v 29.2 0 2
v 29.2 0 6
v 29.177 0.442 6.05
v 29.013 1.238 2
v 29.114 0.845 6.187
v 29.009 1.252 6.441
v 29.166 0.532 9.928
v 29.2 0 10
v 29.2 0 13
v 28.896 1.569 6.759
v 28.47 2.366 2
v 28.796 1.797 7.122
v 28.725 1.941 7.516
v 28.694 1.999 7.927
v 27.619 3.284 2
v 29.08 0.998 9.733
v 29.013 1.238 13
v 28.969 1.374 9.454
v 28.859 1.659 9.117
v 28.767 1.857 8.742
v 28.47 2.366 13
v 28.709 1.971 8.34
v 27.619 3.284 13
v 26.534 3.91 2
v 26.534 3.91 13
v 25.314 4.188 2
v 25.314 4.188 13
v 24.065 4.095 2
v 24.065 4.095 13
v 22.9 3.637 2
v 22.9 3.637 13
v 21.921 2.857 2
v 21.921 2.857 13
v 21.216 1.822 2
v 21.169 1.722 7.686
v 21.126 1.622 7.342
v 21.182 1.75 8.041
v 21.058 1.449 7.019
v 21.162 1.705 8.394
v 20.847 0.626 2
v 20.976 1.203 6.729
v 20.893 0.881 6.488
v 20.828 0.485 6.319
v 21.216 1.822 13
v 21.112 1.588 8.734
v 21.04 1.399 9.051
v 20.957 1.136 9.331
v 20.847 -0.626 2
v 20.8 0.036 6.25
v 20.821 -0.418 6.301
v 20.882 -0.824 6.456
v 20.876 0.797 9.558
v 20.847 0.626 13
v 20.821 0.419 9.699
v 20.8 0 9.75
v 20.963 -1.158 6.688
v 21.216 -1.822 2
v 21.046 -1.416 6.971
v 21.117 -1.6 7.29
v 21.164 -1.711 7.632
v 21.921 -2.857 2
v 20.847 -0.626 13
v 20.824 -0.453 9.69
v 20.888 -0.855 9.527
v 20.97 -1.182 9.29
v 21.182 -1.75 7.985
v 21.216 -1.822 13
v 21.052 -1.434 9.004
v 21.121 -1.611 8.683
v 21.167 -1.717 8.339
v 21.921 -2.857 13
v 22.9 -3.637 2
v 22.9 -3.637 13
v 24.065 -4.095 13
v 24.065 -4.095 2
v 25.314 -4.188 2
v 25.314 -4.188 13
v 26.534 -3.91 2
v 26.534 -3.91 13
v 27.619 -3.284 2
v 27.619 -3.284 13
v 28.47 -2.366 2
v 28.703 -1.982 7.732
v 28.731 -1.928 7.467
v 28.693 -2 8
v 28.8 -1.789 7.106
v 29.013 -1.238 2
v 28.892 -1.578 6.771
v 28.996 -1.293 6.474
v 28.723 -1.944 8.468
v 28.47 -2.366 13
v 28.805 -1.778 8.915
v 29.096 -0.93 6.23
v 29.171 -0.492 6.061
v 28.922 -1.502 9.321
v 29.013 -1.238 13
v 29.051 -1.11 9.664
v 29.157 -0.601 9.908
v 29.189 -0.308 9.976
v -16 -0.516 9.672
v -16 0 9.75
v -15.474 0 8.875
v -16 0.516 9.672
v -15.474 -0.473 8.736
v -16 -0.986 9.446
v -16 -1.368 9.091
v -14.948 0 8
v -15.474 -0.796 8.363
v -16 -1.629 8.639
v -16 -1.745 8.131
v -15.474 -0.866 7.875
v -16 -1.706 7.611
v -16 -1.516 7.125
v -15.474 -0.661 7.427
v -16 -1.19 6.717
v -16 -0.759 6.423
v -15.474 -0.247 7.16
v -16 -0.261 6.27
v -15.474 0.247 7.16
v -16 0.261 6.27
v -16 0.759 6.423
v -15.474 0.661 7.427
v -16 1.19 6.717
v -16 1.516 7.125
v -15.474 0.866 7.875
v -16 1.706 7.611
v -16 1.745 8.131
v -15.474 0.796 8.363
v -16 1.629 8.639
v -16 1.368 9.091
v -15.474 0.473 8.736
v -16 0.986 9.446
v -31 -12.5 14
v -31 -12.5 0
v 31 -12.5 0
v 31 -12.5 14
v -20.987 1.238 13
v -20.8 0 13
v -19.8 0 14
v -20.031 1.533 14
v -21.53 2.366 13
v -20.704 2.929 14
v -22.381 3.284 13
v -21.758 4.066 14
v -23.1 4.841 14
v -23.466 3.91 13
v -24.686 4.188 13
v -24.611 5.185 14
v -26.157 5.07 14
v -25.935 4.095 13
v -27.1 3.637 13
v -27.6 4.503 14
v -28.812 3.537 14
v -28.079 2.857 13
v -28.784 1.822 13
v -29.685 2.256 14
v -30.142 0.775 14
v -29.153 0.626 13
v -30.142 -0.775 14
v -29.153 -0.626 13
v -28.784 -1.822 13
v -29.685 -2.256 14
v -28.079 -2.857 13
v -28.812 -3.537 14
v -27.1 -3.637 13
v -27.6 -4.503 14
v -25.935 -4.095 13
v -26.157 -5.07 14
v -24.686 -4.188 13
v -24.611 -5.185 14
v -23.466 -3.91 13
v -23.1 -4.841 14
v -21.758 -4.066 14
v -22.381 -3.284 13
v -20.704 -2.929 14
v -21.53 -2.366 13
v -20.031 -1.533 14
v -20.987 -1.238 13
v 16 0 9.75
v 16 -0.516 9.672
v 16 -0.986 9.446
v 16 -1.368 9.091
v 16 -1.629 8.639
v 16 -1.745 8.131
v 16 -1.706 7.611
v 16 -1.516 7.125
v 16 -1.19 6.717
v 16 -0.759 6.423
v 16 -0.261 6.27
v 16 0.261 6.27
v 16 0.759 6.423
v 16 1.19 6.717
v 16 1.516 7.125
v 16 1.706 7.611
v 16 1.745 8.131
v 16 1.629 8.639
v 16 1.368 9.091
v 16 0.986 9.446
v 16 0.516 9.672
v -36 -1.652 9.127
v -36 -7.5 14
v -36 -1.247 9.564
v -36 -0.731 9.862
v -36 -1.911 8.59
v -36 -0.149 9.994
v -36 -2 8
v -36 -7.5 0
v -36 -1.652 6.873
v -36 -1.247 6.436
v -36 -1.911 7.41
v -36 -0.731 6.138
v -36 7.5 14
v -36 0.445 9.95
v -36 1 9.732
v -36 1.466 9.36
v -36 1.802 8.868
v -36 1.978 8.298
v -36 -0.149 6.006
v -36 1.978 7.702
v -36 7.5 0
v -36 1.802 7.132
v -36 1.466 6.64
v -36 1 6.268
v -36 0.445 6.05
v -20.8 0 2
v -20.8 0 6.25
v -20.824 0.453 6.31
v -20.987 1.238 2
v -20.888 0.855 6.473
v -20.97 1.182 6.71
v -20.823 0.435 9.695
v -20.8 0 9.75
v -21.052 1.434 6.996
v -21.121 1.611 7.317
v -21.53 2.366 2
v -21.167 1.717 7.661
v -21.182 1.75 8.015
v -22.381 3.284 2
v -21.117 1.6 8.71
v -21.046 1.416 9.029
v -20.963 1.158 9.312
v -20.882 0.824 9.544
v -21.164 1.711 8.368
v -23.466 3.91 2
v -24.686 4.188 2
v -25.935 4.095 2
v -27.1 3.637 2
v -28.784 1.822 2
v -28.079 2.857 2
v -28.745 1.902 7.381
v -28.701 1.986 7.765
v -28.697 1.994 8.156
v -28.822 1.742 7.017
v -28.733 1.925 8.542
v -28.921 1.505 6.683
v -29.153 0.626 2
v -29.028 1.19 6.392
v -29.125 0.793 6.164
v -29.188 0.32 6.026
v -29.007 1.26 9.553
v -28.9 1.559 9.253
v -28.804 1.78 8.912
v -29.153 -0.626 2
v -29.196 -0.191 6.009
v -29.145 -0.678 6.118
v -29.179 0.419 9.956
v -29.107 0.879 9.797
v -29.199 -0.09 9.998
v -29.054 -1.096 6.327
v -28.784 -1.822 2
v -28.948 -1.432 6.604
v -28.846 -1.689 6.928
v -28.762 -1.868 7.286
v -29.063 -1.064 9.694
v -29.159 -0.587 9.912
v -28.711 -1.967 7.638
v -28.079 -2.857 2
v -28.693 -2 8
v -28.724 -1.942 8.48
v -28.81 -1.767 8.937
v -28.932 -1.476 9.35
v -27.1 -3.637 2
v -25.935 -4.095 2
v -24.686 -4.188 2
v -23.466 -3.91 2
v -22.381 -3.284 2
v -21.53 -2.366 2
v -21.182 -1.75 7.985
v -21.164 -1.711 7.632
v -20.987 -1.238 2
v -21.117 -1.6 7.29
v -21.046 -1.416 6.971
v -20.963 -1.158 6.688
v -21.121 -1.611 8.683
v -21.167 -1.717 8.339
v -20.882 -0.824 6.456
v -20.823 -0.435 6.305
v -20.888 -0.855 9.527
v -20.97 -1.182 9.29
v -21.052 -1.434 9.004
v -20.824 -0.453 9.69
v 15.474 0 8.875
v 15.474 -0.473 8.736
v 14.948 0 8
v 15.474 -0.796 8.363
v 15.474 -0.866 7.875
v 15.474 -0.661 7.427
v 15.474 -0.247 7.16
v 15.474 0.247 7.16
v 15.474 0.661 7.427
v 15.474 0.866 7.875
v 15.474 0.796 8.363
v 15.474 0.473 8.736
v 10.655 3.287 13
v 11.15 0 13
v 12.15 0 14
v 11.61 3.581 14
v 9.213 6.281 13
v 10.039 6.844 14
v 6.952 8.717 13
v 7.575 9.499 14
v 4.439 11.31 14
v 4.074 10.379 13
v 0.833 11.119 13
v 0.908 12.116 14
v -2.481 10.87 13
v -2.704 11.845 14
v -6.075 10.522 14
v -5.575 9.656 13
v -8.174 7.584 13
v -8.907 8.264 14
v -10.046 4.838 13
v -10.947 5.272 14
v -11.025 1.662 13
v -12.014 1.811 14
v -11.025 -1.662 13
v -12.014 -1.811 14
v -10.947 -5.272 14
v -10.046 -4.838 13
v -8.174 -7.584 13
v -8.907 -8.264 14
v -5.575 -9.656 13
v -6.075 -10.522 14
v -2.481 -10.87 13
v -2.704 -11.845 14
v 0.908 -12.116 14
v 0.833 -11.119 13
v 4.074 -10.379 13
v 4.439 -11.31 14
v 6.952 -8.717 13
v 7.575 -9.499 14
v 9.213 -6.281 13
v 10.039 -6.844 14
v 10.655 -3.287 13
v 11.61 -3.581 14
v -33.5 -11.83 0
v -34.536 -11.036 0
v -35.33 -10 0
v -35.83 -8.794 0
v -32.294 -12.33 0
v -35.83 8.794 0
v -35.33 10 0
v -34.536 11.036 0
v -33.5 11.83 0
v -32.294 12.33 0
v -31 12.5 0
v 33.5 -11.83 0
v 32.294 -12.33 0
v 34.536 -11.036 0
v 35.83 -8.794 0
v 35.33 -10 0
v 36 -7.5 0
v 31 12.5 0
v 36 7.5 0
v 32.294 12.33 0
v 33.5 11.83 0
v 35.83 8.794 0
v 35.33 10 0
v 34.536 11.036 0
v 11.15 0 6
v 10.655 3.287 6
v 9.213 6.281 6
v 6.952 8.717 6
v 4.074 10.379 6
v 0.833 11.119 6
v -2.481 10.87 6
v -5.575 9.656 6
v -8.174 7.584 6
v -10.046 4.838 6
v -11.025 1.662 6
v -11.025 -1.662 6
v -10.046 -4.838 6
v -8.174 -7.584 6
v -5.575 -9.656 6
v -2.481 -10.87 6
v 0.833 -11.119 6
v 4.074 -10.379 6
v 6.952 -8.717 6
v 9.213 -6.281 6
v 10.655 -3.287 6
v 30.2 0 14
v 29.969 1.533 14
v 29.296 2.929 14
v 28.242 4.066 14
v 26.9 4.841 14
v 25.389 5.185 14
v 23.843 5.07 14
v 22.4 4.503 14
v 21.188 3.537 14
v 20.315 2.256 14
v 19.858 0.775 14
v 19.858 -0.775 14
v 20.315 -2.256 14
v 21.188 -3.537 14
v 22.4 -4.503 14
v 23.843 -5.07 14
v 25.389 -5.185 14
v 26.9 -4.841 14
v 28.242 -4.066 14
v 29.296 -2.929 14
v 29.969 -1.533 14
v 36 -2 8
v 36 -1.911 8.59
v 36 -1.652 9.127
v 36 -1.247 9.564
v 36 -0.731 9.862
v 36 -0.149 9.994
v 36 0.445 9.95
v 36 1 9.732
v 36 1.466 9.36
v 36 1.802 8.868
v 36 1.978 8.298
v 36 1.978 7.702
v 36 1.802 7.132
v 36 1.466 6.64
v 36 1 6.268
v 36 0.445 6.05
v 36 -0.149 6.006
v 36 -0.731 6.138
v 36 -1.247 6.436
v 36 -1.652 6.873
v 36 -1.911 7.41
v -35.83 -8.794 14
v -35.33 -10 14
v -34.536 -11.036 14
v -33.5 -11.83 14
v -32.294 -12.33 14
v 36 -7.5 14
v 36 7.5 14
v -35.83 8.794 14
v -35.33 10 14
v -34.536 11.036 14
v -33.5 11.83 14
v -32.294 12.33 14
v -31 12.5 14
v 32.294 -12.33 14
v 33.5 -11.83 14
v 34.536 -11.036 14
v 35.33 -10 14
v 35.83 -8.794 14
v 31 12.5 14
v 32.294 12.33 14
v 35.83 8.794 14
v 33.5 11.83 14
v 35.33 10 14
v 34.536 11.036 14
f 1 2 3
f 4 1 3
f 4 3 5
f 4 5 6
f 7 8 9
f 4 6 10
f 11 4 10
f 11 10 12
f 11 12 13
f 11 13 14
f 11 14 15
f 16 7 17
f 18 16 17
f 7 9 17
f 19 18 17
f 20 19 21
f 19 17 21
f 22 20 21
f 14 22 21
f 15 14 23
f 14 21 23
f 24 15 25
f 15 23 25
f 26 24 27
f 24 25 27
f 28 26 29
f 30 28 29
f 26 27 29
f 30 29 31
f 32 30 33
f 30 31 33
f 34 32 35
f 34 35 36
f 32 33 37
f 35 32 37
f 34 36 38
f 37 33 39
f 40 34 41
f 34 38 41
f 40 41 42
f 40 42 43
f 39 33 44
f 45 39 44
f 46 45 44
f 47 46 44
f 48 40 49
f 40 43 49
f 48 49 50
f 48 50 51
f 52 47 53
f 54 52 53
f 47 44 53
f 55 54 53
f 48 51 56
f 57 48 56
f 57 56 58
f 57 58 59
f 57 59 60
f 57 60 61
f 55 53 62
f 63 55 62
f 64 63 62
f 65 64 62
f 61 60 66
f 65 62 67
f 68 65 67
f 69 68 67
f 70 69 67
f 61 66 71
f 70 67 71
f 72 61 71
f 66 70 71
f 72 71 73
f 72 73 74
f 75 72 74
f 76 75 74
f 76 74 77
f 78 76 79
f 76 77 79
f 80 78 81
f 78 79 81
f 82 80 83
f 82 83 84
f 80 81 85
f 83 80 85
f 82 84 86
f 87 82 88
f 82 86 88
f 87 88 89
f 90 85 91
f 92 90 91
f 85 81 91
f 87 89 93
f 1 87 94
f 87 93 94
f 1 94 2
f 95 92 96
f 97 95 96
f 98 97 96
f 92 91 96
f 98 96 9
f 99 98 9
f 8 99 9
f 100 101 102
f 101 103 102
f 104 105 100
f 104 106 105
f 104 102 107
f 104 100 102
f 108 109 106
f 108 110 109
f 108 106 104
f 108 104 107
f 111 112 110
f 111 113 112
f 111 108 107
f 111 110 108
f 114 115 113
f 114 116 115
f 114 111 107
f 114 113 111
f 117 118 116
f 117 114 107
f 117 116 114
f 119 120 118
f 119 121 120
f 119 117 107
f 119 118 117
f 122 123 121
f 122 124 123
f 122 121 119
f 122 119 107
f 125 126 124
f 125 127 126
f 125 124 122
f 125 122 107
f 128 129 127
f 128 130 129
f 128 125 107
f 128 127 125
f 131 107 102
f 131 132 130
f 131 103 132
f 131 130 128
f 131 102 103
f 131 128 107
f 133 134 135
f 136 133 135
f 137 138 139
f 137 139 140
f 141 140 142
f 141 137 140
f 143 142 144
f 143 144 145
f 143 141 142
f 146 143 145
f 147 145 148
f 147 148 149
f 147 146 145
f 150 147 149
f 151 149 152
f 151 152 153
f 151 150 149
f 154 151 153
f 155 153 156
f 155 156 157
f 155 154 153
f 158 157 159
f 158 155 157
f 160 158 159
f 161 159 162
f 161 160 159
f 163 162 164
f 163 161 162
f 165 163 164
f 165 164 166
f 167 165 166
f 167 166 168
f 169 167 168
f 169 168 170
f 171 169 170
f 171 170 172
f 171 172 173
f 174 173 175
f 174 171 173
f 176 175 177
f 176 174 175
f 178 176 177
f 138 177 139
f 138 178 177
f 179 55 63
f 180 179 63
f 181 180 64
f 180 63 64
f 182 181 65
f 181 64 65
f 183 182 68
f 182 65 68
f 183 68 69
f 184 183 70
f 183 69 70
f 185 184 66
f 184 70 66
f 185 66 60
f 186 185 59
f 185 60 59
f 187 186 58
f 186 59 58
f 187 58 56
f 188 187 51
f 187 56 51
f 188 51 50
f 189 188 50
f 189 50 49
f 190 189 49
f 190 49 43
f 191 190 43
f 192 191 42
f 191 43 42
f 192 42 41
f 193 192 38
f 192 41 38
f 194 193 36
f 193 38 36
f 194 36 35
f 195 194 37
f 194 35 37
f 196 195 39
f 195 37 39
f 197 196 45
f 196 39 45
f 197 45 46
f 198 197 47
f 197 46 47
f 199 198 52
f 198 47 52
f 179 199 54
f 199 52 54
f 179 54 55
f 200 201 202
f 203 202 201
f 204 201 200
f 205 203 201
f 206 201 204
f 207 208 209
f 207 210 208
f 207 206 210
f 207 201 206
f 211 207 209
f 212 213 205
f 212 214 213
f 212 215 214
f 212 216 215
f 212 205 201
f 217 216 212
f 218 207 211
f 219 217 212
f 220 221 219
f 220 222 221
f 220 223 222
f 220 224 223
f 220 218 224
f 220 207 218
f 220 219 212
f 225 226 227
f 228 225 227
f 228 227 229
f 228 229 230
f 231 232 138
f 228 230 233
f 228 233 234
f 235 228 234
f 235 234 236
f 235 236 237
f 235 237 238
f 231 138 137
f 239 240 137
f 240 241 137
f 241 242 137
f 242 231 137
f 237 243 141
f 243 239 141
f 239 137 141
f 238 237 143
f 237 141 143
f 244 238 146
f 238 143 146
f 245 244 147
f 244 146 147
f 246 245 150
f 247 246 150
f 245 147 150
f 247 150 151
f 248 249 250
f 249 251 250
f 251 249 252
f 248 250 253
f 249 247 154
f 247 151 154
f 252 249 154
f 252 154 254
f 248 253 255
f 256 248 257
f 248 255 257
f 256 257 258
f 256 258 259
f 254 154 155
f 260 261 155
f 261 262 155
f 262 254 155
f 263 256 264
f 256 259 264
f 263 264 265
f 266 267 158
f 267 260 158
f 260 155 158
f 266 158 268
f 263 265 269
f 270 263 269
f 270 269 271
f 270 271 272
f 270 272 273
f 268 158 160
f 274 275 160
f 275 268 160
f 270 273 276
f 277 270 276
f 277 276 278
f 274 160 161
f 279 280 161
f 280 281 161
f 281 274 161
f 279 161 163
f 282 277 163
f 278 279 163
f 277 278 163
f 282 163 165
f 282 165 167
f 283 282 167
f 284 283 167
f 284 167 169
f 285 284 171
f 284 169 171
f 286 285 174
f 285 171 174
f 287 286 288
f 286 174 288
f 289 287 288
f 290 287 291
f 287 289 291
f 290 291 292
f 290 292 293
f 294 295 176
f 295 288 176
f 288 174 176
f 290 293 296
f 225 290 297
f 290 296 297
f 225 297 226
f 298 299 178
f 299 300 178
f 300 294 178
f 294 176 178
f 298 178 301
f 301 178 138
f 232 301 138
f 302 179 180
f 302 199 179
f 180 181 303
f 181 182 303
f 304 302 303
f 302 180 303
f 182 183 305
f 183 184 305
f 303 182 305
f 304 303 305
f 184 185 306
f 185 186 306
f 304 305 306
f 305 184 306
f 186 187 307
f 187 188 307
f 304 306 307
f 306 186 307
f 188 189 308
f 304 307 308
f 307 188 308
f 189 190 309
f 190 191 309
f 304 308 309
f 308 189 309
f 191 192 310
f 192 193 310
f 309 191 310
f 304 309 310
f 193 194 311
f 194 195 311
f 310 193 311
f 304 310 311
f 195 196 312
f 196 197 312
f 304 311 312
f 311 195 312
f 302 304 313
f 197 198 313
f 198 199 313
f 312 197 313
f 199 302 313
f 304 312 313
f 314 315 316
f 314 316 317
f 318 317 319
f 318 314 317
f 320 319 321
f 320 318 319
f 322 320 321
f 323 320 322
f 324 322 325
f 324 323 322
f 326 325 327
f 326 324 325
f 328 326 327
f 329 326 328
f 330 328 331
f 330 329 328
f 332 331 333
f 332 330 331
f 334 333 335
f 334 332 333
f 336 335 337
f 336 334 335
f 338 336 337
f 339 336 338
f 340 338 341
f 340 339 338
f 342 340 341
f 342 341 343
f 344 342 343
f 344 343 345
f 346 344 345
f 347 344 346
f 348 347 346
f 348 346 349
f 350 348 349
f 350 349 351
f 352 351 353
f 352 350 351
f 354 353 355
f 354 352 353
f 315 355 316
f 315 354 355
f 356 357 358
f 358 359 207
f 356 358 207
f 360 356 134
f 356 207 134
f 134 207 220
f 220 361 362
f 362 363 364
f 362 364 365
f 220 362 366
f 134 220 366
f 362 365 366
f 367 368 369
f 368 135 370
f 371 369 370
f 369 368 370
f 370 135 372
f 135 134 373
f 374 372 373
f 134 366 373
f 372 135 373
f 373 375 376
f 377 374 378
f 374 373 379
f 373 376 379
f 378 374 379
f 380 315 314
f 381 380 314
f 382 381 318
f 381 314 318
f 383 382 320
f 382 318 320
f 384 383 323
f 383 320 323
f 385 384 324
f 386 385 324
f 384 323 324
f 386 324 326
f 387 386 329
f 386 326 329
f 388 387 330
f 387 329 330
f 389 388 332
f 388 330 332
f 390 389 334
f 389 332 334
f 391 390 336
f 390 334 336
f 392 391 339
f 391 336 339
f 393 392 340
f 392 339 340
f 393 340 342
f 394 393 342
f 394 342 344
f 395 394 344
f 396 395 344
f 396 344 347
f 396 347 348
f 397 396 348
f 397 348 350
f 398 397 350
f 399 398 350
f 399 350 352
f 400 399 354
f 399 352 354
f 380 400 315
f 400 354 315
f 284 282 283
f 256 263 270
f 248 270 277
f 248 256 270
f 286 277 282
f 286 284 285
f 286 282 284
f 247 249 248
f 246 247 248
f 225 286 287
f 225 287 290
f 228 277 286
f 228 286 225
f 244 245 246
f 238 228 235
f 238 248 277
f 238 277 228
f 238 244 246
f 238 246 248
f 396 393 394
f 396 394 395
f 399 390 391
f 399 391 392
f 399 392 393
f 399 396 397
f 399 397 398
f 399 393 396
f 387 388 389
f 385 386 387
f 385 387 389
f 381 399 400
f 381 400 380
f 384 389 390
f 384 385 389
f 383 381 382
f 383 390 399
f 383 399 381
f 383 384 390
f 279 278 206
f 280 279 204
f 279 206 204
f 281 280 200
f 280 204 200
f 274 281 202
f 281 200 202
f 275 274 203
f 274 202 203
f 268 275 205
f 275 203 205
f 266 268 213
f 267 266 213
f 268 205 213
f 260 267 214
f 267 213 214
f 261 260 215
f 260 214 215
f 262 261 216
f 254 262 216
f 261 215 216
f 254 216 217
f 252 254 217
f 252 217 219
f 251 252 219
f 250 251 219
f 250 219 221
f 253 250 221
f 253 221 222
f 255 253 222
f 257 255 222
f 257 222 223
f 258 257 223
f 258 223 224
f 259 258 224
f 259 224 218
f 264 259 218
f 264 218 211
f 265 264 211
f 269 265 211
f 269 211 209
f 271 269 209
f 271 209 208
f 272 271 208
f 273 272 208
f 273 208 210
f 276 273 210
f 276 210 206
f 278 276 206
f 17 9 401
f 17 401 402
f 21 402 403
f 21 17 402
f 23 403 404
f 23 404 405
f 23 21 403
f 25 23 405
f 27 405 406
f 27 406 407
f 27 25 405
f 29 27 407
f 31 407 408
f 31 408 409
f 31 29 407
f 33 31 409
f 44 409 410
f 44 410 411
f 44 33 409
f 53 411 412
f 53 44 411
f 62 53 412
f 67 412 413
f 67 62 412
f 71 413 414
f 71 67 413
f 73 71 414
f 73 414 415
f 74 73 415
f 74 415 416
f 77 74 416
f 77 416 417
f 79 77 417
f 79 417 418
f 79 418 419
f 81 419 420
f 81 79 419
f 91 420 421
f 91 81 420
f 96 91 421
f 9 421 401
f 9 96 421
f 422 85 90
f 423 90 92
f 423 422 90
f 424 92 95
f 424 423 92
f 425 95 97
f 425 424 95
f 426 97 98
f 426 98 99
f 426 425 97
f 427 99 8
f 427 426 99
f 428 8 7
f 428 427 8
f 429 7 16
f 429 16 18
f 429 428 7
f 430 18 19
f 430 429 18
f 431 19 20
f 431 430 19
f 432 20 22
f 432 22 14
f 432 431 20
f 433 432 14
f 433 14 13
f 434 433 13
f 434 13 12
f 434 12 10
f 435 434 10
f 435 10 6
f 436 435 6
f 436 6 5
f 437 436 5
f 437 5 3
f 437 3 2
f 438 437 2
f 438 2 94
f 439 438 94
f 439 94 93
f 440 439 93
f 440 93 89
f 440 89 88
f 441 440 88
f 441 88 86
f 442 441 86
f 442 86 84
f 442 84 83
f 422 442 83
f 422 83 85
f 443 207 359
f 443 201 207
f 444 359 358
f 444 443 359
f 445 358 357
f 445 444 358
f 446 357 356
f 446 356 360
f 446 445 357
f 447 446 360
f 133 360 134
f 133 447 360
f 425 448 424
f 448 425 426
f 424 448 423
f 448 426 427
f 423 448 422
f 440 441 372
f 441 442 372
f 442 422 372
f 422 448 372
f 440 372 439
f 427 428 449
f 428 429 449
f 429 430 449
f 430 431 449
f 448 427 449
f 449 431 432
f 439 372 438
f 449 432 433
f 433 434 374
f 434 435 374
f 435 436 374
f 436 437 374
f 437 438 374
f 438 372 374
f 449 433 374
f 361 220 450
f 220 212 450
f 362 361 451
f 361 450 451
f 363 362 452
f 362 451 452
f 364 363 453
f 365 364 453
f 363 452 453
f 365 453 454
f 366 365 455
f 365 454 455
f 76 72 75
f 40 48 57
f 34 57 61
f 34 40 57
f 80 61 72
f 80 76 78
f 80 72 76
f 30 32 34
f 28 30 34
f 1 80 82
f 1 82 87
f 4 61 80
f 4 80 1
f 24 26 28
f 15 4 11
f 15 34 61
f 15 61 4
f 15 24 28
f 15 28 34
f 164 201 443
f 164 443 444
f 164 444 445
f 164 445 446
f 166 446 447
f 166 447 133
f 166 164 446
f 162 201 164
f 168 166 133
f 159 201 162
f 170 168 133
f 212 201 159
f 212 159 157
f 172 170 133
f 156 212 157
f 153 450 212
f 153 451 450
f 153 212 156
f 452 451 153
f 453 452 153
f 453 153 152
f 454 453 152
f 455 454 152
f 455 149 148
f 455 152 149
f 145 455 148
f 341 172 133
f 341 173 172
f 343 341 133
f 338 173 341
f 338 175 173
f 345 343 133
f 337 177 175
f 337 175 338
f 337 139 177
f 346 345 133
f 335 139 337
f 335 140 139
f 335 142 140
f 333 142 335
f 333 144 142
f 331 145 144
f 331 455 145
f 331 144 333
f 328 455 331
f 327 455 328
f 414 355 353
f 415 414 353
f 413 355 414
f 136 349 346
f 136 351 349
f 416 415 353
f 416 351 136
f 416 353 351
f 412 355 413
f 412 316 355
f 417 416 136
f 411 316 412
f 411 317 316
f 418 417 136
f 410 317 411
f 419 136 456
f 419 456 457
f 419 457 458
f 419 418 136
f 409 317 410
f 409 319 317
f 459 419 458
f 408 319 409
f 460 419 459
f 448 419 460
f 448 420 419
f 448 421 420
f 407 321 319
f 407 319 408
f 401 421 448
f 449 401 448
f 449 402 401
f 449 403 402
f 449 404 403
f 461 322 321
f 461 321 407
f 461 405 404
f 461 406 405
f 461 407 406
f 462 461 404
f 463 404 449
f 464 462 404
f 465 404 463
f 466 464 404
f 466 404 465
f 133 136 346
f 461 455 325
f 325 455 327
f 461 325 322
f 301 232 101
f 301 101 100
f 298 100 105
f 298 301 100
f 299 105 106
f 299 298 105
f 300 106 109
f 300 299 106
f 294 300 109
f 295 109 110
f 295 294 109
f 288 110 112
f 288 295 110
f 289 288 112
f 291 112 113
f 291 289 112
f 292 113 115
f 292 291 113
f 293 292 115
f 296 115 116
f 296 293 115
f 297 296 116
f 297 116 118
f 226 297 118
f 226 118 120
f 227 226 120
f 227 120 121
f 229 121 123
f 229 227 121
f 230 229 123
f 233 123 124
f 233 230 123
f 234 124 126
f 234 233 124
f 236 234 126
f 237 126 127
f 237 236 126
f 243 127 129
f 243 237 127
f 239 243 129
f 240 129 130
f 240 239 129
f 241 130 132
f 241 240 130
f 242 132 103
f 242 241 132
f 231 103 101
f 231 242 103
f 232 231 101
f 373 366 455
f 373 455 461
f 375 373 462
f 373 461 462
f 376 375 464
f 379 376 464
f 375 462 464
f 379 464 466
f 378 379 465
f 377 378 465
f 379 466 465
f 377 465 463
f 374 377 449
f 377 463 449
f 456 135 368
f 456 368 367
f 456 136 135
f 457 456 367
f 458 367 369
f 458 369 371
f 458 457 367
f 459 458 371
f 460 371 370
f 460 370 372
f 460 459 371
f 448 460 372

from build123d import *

# Parameters (mm, degrees)
SKETCH1_W               = 72
SKETCH1_H               = 25
BOSS_EXTRUDE1_DEPTH     = 14
SKETCH2_R               = 11.15
CUT_EXTRUDE1_DEPTH      = 8
SKETCH3_R               = 4.2
CUT_EXTRUDE2_DEPTH      = 12
CUT_EXTRUDE3_REACH      = 76.406
CUT_EXTRUDE3_END_RADIUS = 4.2
SKETCH6_R               = 2
ZAOKR_GLENIE1_R         = 5
SFAZOWANIE1_SIZE        = 1


with BuildPart() as part:
    # Sketch1 → Boss-Extrude1 (new body)
    with BuildSketch(Plane.XY):
        Rectangle(SKETCH1_W, SKETCH1_H)
    extrude(amount=BOSS_EXTRUDE1_DEPTH)

    # Sketch2 → Cut-Extrude1 (cut)
    with BuildSketch(Plane.XY.offset(14)):
        Circle(SKETCH2_R)
    extrude(amount=-CUT_EXTRUDE1_DEPTH, mode=Mode.SUBTRACT)

    # Sketch3 → Cut-Extrude2 (cut)
    with BuildSketch(Plane.XY.offset(14)):
        with Locations((-25, 0)):
            Circle(SKETCH3_R)
        with Locations((25, 0)):
            Circle(SKETCH3_R)
    extrude(amount=-CUT_EXTRUDE2_DEPTH, mode=Mode.SUBTRACT)

    # Sketch5 → Ø3.5 (3.5) Diameter Hole1 (revolve, cut)
    with BuildSketch(Plane(origin=(-36, 0, 8), x_dir=(0, 0, 1), z_dir=(0, 1, 0))):
        Polygon((0, 0), (0, 21.051506083), (1.75, 20), (1.75, 0), align=None)
    f_3_5_3_5_diameter_hole1 = revolve(axis=Axis((-42.35, 0, 8), (1, 0, 0)), mode=Mode.SUBTRACT)

    # Cut-Extrude3: up to this cylinder (the profile starts outside it)
    cut_extrude3_end = Plane(origin=(-25, 0, 8), z_dir=(0, 0, 1)) * Cylinder(CUT_EXTRUDE3_END_RADIUS, 162.212, mode=Mode.PRIVATE)
    # Sketch6 → Cut-Extrude3 (cut, up to the surface)
    with BuildSketch(Plane.ZY.offset(36), mode=Mode.PRIVATE) as cut_extrude3_sk1:
        with Locations(Location((8, 0, 0), (0, 0, 270))):
            Circle(SKETCH6_R)
    cut_extrude3_tool1 = extrude(cut_extrude3_sk1.sketch, amount=-CUT_EXTRUDE3_REACH, mode=Mode.PRIVATE) - cut_extrude3_end
    cut_extrude3 = cut_extrude3_tool1.solids().sort_by_distance((-36, 0, 8))[0]
    add(cut_extrude3, mode=Mode.SUBTRACT)

    # Mirror1: Ø3.5 (3.5) Diameter Hole1, Cut-Extrude3 across plane
    add(f_3_5_3_5_diameter_hole1.mirror(Plane(origin=(0, 0, 0), x_dir=(0, 0, 1), z_dir=(1, 0, 0))), mode=Mode.SUBTRACT)
    add(cut_extrude3.mirror(Plane(origin=(0, 0, 0), x_dir=(0, 0, 1), z_dir=(1, 0, 0))), mode=Mode.SUBTRACT)

    # Zaokrąglenie1
    zaokr_glenie1_edges = [part.edges().sort_by_distance(p)[0] for p in [
        (-36, 12.5, 7),
        (36, 12.5, 7),
        (36, -12.5, 7),
        (-36, -12.5, 7),
    ]]
    fillet(zaokr_glenie1_edges, radius=ZAOKR_GLENIE1_R)

    # Sfazowanie1
    sfazowanie1_edges = [part.edges().sort_by_distance(p)[0] for p in [
        (-11.15, 0, 14),
        (-29.2, 0, 14),
        (20.8, 0, 14),
    ]]
    chamfer(sfazowanie1_edges, length=SFAZOWANIE1_SIZE)


solid = part.part
